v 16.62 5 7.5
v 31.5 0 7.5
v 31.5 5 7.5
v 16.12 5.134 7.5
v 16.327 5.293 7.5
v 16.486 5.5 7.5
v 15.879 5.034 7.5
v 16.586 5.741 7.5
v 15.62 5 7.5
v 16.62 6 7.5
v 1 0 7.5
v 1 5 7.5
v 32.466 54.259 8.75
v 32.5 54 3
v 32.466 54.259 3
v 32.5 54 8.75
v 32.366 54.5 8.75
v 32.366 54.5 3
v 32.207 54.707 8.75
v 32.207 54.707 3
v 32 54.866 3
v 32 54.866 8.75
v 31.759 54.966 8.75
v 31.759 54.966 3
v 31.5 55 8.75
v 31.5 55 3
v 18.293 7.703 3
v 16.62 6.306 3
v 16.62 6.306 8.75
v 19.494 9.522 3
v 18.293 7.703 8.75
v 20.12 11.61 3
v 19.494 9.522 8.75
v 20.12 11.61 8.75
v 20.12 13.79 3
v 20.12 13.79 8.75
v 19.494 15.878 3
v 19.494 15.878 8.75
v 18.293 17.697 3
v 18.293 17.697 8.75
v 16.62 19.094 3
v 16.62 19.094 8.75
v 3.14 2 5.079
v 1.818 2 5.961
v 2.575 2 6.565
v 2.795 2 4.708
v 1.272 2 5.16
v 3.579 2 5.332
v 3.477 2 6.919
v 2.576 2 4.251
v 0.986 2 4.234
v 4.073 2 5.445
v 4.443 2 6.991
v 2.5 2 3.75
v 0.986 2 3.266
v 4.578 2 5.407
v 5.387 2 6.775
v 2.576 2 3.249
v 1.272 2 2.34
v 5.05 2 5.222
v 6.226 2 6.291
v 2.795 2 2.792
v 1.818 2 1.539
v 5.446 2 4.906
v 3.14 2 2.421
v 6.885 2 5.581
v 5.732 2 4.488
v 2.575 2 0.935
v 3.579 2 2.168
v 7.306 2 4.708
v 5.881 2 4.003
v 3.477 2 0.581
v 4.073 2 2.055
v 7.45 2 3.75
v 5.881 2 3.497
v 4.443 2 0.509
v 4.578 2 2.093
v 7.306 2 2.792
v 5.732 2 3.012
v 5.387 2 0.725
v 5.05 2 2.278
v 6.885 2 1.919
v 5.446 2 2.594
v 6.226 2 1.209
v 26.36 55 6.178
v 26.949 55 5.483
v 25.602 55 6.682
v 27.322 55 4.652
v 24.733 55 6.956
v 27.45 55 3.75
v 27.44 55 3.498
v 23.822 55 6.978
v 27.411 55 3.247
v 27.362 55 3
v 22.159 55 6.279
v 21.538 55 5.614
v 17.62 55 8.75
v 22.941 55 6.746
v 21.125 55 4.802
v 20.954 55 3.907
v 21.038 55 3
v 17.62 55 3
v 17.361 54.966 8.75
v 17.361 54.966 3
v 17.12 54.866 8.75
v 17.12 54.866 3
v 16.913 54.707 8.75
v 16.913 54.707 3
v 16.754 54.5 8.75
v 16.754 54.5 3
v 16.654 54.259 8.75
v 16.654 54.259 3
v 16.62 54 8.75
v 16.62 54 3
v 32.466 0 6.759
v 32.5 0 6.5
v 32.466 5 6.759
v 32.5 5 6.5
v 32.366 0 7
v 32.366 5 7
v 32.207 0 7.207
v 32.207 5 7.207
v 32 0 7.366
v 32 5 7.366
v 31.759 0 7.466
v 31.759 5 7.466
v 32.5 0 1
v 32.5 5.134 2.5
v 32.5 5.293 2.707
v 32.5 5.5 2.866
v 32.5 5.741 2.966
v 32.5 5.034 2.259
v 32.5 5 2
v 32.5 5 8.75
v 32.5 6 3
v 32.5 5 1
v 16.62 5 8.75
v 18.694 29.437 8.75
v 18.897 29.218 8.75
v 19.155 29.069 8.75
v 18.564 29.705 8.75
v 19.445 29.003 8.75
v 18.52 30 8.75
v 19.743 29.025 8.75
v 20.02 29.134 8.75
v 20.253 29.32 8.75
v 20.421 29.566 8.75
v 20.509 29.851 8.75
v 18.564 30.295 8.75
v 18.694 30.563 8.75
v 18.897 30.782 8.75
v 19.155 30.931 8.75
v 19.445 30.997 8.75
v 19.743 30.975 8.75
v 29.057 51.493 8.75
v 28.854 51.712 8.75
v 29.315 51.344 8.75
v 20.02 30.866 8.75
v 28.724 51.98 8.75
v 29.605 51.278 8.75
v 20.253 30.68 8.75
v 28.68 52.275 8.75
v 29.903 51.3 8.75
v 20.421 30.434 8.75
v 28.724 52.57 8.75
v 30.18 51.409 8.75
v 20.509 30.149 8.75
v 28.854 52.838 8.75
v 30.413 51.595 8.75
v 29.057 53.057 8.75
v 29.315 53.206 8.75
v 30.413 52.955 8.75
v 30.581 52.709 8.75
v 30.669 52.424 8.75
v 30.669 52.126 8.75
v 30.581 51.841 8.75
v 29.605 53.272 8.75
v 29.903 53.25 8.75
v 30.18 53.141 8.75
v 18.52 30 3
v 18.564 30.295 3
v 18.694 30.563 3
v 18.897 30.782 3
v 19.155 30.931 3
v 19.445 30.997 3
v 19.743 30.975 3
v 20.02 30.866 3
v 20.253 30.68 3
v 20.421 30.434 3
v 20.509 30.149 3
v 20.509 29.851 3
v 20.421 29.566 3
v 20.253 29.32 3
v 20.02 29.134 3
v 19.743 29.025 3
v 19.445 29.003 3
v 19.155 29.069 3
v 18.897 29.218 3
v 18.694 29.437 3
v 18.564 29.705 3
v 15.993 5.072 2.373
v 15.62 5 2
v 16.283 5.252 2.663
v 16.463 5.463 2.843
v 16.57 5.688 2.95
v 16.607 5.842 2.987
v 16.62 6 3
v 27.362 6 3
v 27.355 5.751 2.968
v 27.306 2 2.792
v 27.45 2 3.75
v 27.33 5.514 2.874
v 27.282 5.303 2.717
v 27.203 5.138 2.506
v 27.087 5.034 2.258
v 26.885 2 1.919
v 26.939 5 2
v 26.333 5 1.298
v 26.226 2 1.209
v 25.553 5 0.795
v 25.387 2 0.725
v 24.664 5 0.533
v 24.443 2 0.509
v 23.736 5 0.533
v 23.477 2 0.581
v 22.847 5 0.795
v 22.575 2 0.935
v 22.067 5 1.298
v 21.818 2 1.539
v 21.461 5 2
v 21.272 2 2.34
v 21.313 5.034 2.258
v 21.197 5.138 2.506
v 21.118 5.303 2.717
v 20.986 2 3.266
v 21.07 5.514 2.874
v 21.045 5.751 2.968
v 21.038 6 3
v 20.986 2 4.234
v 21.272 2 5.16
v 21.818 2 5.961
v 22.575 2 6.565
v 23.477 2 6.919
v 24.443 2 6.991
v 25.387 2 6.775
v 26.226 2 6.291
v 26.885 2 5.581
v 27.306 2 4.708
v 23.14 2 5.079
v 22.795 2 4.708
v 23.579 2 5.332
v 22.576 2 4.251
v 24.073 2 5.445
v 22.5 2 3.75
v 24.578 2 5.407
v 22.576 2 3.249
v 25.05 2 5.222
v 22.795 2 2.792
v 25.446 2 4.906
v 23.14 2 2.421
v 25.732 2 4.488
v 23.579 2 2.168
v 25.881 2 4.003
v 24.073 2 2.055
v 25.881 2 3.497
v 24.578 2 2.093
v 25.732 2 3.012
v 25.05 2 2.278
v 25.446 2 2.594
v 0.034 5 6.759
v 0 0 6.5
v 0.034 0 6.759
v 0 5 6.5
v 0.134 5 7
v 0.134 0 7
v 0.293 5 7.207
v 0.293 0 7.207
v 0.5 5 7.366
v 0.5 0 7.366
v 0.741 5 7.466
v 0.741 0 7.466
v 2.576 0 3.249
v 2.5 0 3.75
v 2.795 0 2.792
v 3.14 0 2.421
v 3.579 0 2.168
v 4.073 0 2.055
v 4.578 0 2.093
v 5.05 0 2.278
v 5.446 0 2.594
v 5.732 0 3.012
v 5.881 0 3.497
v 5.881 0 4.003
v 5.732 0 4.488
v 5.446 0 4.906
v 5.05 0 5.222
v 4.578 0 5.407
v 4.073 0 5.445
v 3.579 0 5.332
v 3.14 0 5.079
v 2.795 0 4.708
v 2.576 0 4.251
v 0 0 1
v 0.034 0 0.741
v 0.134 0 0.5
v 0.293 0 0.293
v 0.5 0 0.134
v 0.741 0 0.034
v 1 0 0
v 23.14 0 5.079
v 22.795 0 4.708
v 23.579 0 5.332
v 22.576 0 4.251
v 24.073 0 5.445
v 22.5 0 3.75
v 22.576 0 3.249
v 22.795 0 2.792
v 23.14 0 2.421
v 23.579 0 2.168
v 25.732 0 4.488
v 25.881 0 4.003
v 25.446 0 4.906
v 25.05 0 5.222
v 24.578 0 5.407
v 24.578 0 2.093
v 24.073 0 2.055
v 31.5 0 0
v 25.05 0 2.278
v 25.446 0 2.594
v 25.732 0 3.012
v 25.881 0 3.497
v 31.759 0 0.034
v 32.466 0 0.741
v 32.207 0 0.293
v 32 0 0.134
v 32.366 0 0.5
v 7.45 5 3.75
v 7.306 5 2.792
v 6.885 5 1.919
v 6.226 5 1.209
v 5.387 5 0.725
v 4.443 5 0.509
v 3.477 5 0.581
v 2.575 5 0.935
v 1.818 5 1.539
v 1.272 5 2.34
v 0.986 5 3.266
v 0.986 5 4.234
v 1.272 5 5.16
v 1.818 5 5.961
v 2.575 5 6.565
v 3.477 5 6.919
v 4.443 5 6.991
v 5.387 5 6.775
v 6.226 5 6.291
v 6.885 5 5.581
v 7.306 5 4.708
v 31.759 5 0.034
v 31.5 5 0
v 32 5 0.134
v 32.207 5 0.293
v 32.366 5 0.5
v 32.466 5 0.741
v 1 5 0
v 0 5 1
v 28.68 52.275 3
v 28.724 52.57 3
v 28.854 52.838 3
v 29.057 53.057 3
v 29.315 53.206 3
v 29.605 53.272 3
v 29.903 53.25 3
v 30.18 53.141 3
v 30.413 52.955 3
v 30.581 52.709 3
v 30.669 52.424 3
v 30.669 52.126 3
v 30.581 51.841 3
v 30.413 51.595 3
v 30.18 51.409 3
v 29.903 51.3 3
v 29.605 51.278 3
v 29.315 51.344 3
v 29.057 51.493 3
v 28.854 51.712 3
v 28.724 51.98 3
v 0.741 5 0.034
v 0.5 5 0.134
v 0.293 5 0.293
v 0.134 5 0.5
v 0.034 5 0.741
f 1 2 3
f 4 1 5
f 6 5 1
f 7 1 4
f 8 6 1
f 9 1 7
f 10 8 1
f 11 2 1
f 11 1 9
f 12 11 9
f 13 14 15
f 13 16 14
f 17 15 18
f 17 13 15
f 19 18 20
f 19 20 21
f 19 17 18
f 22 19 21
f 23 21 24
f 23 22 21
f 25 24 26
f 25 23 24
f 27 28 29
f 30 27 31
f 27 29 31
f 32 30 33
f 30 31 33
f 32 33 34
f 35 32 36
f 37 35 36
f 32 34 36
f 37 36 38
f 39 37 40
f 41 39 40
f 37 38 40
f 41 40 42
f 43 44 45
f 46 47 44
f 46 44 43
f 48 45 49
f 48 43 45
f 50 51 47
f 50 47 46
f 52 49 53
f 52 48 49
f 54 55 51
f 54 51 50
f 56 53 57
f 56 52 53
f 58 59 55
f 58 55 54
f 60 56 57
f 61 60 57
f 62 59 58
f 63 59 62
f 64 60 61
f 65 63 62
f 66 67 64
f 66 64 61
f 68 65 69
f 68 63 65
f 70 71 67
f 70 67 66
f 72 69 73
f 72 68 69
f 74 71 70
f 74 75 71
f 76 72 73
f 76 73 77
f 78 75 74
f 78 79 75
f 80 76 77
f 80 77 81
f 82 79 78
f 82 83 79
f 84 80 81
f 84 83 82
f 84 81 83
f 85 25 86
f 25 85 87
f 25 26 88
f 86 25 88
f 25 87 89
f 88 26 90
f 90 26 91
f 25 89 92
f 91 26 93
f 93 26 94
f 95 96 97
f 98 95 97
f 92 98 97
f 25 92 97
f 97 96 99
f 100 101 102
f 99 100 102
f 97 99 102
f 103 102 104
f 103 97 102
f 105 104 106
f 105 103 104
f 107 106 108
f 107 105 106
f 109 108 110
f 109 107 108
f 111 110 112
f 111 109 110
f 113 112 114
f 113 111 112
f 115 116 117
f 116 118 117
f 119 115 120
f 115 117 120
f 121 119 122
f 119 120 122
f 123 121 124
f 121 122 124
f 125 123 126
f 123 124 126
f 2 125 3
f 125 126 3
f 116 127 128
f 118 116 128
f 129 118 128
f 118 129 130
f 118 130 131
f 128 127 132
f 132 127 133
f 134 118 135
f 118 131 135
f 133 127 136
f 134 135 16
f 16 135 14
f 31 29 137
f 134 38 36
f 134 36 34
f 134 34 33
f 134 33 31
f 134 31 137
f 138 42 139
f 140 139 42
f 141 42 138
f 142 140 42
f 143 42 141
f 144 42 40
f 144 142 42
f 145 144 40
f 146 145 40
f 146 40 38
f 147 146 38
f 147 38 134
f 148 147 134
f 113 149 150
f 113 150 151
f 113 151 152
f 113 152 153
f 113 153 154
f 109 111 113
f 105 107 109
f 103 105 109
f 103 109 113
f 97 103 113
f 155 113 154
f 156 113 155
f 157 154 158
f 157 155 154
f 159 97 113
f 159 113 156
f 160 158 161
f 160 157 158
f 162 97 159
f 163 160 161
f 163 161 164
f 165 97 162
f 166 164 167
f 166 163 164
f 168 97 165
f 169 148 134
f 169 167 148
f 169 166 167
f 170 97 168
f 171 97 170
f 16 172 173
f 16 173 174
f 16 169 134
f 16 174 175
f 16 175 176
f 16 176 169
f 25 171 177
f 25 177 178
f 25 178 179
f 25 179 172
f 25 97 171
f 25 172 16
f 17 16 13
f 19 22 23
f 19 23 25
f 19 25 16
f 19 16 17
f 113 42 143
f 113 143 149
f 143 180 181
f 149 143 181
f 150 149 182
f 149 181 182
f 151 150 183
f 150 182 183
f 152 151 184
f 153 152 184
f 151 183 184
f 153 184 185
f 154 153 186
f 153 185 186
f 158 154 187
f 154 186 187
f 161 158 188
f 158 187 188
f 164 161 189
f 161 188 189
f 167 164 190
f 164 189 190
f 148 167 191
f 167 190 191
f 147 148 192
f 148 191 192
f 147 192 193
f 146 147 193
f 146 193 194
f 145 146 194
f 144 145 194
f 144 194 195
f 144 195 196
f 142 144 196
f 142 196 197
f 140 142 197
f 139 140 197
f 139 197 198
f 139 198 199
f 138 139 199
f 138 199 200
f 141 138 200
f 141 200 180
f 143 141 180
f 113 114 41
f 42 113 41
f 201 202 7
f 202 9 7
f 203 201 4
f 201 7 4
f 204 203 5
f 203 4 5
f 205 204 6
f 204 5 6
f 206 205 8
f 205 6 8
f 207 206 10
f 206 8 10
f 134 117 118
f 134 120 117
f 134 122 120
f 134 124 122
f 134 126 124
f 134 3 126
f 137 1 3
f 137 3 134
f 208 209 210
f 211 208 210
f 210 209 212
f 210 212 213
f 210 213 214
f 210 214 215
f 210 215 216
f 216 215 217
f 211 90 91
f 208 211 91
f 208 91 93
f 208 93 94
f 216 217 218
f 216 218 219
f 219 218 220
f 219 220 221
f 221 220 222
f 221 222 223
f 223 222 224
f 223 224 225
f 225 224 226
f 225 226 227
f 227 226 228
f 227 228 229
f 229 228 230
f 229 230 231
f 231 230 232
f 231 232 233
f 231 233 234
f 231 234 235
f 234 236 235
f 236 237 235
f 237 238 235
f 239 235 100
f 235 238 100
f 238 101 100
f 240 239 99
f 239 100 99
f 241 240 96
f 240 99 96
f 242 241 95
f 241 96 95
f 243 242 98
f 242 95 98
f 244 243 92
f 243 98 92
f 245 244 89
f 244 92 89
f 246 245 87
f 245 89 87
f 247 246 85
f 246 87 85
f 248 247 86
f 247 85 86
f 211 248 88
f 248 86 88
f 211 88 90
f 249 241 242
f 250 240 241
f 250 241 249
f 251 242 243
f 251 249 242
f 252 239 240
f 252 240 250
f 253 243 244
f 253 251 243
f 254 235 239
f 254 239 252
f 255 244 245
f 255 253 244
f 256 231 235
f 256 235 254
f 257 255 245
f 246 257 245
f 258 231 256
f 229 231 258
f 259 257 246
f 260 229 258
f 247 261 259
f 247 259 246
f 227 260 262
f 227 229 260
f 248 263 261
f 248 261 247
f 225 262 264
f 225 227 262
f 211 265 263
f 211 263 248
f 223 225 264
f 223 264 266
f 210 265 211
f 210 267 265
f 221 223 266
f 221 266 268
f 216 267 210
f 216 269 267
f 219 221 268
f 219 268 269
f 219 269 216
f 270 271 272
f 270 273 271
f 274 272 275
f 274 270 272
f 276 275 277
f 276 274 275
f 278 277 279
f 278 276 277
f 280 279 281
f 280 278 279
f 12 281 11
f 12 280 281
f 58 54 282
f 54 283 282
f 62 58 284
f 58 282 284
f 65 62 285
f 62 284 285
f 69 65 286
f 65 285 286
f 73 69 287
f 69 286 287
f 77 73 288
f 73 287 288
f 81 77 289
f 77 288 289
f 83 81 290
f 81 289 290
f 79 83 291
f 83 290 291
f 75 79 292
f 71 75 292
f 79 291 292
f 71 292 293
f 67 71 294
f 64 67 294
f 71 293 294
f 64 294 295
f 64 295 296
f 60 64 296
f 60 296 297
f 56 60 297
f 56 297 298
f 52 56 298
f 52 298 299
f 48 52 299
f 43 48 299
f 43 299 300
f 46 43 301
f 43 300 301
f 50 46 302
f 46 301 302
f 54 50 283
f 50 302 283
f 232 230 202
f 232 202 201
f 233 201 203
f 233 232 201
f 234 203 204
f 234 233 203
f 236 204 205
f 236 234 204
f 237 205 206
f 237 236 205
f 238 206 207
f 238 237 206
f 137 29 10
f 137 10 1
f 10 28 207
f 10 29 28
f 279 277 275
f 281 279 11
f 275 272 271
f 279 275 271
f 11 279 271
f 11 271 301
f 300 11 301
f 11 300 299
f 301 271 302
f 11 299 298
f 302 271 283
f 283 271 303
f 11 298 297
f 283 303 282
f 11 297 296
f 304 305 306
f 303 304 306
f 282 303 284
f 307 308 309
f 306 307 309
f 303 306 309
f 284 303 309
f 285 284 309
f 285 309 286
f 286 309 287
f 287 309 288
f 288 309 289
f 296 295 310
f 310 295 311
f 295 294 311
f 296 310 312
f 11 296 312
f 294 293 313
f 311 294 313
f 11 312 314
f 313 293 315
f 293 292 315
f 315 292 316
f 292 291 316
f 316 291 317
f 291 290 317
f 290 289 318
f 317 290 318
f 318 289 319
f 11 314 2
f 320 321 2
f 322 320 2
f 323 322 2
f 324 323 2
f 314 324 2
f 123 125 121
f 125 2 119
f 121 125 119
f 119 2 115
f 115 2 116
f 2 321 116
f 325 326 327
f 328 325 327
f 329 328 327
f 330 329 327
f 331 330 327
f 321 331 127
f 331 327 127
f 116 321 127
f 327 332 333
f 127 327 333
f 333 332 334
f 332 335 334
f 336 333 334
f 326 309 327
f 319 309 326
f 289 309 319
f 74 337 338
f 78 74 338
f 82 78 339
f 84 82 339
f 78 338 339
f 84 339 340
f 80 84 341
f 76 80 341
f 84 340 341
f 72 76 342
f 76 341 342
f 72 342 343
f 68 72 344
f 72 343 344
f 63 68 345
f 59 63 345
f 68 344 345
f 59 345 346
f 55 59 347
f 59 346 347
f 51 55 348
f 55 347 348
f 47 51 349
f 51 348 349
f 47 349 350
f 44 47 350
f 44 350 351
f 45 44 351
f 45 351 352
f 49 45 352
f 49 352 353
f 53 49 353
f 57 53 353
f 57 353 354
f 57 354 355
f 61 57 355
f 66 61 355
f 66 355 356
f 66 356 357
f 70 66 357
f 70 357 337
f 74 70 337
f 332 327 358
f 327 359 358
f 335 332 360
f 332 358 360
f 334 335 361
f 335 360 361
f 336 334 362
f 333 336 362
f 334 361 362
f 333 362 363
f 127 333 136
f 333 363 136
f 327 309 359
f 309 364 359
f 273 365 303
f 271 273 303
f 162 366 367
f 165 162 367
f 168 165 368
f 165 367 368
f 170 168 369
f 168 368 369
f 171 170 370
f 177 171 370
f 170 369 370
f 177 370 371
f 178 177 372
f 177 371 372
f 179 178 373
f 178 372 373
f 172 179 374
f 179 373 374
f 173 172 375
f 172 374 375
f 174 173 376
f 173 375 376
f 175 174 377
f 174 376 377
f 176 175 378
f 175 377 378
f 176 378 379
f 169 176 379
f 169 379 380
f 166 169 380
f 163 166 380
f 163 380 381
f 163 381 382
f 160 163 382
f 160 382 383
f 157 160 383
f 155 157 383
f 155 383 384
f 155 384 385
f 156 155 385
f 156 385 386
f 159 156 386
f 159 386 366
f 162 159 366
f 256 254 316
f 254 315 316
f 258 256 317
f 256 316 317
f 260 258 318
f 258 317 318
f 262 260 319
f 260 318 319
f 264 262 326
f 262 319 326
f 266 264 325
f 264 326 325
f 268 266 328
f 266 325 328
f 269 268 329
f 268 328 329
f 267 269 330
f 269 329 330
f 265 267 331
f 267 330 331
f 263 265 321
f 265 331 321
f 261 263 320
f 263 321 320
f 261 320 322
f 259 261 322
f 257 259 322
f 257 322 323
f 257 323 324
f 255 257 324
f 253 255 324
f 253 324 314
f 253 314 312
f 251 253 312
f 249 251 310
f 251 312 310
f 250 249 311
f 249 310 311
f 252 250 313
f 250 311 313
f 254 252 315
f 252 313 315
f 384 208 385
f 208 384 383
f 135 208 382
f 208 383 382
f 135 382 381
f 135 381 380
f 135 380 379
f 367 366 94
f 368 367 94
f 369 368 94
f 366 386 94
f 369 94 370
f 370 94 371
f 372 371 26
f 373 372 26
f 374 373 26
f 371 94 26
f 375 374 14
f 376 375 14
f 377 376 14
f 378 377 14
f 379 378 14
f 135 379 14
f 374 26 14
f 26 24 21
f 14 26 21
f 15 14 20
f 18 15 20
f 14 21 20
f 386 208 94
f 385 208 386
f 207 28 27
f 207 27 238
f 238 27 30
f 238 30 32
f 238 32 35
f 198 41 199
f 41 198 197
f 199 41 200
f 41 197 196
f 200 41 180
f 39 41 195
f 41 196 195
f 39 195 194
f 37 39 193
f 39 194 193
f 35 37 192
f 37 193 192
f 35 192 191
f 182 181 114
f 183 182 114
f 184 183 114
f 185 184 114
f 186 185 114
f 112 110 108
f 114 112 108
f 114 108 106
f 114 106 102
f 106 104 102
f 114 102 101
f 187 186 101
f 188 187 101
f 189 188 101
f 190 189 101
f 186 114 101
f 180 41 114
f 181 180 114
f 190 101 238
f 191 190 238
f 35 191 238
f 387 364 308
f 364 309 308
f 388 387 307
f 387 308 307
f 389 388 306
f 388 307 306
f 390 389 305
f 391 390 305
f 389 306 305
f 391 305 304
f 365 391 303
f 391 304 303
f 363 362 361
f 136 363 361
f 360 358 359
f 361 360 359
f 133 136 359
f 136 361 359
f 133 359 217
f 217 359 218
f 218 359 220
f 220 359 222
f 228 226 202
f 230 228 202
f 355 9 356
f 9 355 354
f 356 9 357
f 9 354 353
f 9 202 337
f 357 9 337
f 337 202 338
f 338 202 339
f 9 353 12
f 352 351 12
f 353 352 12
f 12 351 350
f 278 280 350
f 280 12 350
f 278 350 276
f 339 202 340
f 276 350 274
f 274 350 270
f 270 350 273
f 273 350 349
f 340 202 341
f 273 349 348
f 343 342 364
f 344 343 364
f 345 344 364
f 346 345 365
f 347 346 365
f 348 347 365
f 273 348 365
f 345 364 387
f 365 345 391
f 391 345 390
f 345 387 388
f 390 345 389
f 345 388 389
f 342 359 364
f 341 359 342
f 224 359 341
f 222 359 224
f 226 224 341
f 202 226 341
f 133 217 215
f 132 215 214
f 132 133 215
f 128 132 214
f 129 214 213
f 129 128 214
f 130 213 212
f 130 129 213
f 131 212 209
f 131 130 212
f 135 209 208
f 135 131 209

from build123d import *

# Parameters (mm, degrees)
BOSS_EXTRUDE1_DEPTH            = 8.75
M3_CLEARANCE_HOLE1_D           = 2
CUT_EXTRUDE2_REACH             = 66.481
SKETCH5_W                      = 1.25
SKETCH5_H                      = 5
SKETCH7_W                      = 15.88
SKETCH7_H                      = 3
CUT_EXTRUDE4_DEPTH             = 50
CBORE_FOR_M3_SHCS1_D           = 3.4
CBORE_FOR_M3_SHCS1_CBORE_D     = 6.5
CBORE_FOR_M3_SHCS1_CBORE_DEPTH = 3
FILLET1_R                      = 1
SKETCH12_R                     = 7.5
CUT_EXTRUDE5_DEPTH             = 5.75
CBORE_FOR_M3_SHCS2_D           = 3.4
CBORE_FOR_M3_SHCS2_CBORE_D     = 6.5
CBORE_FOR_M3_SHCS2_CBORE_DEPTH = 53


with BuildPart() as part:
    # Sketch1 → Boss-Extrude1 (new body)
    with BuildSketch(Plane.XY):
        Polygon((0, 0), (32.5, 0), (32.5, 4.239766082), (32.5, 55), (16.62, 55), (16.62, 5), (0, 5), align=None)
    extrude(amount=BOSS_EXTRUDE1_DEPTH)

    # M3 Clearance Hole1 (through all)
    with Locations(Plane.XY.offset(8.75)):
        with Locations((29.68, 52.275), (19.52, 30)):
            Hole(M3_CLEARANCE_HOLE1_D / 2)

    # Cut-Extrude2: up to this face of the body (flat: up to its plane)
    cut_extrude2_end = Plane(part.part.faces().sort_by_distance((32.5, 27.5, 4.375))[0])
    # Sketch5 → Cut-Extrude2 (cut, up to the picked face)
    with BuildSketch(Plane.ZY, mode=Mode.PRIVATE) as cut_extrude2_sk1:
        with Locations((8.125, 2.5)):
            Rectangle(SKETCH5_W, SKETCH5_H)
    cut_extrude2_tool1 = split(extrude(cut_extrude2_sk1.sketch, amount=-CUT_EXTRUDE2_REACH, mode=Mode.PRIVATE), bisect_by=cut_extrude2_end, keep=Keep.BOTH, mode=Mode.PRIVATE)
    add(cut_extrude2_tool1.solids().sort_by(Axis((0, 2.5, 8.125), (1, 0, 0)))[0], mode=Mode.SUBTRACT)

    # Sketch7 → Cut-Extrude4 (cut)
    with BuildSketch(Plane(origin=(0, 55, 0), x_dir=(1, 0, 0), z_dir=(0, 1, 0))):
        with Locations((24.56, -1.5)):
            Rectangle(SKETCH7_W, SKETCH7_H)
    extrude(amount=-CUT_EXTRUDE4_DEPTH, mode=Mode.SUBTRACT)

    # CBORE for M3 SHCS1 (through all)
    with Locations(Plane(origin=(0, 5, 0), x_dir=(1, 0, 0), z_dir=(0, 1, 0))):
        with Locations((4.2, -3.75)):
            CounterBoreHole(CBORE_FOR_M3_SHCS1_D / 2, CBORE_FOR_M3_SHCS1_CBORE_D / 2, CBORE_FOR_M3_SHCS1_CBORE_DEPTH)

    # Fillet1
    fillet1_edges = [part.edges().sort_by_distance(p)[0] for p in [
        (16.62, 55, 5.875),
        (32.5, 55, 5.875),
        (16.62, 5, 5.25),
        (0, 2.5, 7.5),
        (32.5, 2.5, 7.5),
        (24.56, 5, 3),
        (32.5, 2.5, 0),
        (0, 2.5, 0),
    ]]
    fillet(fillet1_edges, radius=FILLET1_R)

    # Sketch12 → Cut-Extrude5 (cut)
    with BuildSketch(Plane.XY.offset(8.75)):
        with Locations((12.7, 12.7)):
            Circle(SKETCH12_R)
    extrude(amount=-CUT_EXTRUDE5_DEPTH, mode=Mode.SUBTRACT)

    # CBORE for M3 SHCS2 (through all)
    with Locations(Plane(origin=(0, 55, 0), x_dir=(1, 0, 0), z_dir=(0, 1, 0))):
        with Locations((24.2, -3.75)):
            CounterBoreHole(CBORE_FOR_M3_SHCS2_D / 2, CBORE_FOR_M3_SHCS2_CBORE_D / 2, CBORE_FOR_M3_SHCS2_CBORE_DEPTH)


solid = part.part
